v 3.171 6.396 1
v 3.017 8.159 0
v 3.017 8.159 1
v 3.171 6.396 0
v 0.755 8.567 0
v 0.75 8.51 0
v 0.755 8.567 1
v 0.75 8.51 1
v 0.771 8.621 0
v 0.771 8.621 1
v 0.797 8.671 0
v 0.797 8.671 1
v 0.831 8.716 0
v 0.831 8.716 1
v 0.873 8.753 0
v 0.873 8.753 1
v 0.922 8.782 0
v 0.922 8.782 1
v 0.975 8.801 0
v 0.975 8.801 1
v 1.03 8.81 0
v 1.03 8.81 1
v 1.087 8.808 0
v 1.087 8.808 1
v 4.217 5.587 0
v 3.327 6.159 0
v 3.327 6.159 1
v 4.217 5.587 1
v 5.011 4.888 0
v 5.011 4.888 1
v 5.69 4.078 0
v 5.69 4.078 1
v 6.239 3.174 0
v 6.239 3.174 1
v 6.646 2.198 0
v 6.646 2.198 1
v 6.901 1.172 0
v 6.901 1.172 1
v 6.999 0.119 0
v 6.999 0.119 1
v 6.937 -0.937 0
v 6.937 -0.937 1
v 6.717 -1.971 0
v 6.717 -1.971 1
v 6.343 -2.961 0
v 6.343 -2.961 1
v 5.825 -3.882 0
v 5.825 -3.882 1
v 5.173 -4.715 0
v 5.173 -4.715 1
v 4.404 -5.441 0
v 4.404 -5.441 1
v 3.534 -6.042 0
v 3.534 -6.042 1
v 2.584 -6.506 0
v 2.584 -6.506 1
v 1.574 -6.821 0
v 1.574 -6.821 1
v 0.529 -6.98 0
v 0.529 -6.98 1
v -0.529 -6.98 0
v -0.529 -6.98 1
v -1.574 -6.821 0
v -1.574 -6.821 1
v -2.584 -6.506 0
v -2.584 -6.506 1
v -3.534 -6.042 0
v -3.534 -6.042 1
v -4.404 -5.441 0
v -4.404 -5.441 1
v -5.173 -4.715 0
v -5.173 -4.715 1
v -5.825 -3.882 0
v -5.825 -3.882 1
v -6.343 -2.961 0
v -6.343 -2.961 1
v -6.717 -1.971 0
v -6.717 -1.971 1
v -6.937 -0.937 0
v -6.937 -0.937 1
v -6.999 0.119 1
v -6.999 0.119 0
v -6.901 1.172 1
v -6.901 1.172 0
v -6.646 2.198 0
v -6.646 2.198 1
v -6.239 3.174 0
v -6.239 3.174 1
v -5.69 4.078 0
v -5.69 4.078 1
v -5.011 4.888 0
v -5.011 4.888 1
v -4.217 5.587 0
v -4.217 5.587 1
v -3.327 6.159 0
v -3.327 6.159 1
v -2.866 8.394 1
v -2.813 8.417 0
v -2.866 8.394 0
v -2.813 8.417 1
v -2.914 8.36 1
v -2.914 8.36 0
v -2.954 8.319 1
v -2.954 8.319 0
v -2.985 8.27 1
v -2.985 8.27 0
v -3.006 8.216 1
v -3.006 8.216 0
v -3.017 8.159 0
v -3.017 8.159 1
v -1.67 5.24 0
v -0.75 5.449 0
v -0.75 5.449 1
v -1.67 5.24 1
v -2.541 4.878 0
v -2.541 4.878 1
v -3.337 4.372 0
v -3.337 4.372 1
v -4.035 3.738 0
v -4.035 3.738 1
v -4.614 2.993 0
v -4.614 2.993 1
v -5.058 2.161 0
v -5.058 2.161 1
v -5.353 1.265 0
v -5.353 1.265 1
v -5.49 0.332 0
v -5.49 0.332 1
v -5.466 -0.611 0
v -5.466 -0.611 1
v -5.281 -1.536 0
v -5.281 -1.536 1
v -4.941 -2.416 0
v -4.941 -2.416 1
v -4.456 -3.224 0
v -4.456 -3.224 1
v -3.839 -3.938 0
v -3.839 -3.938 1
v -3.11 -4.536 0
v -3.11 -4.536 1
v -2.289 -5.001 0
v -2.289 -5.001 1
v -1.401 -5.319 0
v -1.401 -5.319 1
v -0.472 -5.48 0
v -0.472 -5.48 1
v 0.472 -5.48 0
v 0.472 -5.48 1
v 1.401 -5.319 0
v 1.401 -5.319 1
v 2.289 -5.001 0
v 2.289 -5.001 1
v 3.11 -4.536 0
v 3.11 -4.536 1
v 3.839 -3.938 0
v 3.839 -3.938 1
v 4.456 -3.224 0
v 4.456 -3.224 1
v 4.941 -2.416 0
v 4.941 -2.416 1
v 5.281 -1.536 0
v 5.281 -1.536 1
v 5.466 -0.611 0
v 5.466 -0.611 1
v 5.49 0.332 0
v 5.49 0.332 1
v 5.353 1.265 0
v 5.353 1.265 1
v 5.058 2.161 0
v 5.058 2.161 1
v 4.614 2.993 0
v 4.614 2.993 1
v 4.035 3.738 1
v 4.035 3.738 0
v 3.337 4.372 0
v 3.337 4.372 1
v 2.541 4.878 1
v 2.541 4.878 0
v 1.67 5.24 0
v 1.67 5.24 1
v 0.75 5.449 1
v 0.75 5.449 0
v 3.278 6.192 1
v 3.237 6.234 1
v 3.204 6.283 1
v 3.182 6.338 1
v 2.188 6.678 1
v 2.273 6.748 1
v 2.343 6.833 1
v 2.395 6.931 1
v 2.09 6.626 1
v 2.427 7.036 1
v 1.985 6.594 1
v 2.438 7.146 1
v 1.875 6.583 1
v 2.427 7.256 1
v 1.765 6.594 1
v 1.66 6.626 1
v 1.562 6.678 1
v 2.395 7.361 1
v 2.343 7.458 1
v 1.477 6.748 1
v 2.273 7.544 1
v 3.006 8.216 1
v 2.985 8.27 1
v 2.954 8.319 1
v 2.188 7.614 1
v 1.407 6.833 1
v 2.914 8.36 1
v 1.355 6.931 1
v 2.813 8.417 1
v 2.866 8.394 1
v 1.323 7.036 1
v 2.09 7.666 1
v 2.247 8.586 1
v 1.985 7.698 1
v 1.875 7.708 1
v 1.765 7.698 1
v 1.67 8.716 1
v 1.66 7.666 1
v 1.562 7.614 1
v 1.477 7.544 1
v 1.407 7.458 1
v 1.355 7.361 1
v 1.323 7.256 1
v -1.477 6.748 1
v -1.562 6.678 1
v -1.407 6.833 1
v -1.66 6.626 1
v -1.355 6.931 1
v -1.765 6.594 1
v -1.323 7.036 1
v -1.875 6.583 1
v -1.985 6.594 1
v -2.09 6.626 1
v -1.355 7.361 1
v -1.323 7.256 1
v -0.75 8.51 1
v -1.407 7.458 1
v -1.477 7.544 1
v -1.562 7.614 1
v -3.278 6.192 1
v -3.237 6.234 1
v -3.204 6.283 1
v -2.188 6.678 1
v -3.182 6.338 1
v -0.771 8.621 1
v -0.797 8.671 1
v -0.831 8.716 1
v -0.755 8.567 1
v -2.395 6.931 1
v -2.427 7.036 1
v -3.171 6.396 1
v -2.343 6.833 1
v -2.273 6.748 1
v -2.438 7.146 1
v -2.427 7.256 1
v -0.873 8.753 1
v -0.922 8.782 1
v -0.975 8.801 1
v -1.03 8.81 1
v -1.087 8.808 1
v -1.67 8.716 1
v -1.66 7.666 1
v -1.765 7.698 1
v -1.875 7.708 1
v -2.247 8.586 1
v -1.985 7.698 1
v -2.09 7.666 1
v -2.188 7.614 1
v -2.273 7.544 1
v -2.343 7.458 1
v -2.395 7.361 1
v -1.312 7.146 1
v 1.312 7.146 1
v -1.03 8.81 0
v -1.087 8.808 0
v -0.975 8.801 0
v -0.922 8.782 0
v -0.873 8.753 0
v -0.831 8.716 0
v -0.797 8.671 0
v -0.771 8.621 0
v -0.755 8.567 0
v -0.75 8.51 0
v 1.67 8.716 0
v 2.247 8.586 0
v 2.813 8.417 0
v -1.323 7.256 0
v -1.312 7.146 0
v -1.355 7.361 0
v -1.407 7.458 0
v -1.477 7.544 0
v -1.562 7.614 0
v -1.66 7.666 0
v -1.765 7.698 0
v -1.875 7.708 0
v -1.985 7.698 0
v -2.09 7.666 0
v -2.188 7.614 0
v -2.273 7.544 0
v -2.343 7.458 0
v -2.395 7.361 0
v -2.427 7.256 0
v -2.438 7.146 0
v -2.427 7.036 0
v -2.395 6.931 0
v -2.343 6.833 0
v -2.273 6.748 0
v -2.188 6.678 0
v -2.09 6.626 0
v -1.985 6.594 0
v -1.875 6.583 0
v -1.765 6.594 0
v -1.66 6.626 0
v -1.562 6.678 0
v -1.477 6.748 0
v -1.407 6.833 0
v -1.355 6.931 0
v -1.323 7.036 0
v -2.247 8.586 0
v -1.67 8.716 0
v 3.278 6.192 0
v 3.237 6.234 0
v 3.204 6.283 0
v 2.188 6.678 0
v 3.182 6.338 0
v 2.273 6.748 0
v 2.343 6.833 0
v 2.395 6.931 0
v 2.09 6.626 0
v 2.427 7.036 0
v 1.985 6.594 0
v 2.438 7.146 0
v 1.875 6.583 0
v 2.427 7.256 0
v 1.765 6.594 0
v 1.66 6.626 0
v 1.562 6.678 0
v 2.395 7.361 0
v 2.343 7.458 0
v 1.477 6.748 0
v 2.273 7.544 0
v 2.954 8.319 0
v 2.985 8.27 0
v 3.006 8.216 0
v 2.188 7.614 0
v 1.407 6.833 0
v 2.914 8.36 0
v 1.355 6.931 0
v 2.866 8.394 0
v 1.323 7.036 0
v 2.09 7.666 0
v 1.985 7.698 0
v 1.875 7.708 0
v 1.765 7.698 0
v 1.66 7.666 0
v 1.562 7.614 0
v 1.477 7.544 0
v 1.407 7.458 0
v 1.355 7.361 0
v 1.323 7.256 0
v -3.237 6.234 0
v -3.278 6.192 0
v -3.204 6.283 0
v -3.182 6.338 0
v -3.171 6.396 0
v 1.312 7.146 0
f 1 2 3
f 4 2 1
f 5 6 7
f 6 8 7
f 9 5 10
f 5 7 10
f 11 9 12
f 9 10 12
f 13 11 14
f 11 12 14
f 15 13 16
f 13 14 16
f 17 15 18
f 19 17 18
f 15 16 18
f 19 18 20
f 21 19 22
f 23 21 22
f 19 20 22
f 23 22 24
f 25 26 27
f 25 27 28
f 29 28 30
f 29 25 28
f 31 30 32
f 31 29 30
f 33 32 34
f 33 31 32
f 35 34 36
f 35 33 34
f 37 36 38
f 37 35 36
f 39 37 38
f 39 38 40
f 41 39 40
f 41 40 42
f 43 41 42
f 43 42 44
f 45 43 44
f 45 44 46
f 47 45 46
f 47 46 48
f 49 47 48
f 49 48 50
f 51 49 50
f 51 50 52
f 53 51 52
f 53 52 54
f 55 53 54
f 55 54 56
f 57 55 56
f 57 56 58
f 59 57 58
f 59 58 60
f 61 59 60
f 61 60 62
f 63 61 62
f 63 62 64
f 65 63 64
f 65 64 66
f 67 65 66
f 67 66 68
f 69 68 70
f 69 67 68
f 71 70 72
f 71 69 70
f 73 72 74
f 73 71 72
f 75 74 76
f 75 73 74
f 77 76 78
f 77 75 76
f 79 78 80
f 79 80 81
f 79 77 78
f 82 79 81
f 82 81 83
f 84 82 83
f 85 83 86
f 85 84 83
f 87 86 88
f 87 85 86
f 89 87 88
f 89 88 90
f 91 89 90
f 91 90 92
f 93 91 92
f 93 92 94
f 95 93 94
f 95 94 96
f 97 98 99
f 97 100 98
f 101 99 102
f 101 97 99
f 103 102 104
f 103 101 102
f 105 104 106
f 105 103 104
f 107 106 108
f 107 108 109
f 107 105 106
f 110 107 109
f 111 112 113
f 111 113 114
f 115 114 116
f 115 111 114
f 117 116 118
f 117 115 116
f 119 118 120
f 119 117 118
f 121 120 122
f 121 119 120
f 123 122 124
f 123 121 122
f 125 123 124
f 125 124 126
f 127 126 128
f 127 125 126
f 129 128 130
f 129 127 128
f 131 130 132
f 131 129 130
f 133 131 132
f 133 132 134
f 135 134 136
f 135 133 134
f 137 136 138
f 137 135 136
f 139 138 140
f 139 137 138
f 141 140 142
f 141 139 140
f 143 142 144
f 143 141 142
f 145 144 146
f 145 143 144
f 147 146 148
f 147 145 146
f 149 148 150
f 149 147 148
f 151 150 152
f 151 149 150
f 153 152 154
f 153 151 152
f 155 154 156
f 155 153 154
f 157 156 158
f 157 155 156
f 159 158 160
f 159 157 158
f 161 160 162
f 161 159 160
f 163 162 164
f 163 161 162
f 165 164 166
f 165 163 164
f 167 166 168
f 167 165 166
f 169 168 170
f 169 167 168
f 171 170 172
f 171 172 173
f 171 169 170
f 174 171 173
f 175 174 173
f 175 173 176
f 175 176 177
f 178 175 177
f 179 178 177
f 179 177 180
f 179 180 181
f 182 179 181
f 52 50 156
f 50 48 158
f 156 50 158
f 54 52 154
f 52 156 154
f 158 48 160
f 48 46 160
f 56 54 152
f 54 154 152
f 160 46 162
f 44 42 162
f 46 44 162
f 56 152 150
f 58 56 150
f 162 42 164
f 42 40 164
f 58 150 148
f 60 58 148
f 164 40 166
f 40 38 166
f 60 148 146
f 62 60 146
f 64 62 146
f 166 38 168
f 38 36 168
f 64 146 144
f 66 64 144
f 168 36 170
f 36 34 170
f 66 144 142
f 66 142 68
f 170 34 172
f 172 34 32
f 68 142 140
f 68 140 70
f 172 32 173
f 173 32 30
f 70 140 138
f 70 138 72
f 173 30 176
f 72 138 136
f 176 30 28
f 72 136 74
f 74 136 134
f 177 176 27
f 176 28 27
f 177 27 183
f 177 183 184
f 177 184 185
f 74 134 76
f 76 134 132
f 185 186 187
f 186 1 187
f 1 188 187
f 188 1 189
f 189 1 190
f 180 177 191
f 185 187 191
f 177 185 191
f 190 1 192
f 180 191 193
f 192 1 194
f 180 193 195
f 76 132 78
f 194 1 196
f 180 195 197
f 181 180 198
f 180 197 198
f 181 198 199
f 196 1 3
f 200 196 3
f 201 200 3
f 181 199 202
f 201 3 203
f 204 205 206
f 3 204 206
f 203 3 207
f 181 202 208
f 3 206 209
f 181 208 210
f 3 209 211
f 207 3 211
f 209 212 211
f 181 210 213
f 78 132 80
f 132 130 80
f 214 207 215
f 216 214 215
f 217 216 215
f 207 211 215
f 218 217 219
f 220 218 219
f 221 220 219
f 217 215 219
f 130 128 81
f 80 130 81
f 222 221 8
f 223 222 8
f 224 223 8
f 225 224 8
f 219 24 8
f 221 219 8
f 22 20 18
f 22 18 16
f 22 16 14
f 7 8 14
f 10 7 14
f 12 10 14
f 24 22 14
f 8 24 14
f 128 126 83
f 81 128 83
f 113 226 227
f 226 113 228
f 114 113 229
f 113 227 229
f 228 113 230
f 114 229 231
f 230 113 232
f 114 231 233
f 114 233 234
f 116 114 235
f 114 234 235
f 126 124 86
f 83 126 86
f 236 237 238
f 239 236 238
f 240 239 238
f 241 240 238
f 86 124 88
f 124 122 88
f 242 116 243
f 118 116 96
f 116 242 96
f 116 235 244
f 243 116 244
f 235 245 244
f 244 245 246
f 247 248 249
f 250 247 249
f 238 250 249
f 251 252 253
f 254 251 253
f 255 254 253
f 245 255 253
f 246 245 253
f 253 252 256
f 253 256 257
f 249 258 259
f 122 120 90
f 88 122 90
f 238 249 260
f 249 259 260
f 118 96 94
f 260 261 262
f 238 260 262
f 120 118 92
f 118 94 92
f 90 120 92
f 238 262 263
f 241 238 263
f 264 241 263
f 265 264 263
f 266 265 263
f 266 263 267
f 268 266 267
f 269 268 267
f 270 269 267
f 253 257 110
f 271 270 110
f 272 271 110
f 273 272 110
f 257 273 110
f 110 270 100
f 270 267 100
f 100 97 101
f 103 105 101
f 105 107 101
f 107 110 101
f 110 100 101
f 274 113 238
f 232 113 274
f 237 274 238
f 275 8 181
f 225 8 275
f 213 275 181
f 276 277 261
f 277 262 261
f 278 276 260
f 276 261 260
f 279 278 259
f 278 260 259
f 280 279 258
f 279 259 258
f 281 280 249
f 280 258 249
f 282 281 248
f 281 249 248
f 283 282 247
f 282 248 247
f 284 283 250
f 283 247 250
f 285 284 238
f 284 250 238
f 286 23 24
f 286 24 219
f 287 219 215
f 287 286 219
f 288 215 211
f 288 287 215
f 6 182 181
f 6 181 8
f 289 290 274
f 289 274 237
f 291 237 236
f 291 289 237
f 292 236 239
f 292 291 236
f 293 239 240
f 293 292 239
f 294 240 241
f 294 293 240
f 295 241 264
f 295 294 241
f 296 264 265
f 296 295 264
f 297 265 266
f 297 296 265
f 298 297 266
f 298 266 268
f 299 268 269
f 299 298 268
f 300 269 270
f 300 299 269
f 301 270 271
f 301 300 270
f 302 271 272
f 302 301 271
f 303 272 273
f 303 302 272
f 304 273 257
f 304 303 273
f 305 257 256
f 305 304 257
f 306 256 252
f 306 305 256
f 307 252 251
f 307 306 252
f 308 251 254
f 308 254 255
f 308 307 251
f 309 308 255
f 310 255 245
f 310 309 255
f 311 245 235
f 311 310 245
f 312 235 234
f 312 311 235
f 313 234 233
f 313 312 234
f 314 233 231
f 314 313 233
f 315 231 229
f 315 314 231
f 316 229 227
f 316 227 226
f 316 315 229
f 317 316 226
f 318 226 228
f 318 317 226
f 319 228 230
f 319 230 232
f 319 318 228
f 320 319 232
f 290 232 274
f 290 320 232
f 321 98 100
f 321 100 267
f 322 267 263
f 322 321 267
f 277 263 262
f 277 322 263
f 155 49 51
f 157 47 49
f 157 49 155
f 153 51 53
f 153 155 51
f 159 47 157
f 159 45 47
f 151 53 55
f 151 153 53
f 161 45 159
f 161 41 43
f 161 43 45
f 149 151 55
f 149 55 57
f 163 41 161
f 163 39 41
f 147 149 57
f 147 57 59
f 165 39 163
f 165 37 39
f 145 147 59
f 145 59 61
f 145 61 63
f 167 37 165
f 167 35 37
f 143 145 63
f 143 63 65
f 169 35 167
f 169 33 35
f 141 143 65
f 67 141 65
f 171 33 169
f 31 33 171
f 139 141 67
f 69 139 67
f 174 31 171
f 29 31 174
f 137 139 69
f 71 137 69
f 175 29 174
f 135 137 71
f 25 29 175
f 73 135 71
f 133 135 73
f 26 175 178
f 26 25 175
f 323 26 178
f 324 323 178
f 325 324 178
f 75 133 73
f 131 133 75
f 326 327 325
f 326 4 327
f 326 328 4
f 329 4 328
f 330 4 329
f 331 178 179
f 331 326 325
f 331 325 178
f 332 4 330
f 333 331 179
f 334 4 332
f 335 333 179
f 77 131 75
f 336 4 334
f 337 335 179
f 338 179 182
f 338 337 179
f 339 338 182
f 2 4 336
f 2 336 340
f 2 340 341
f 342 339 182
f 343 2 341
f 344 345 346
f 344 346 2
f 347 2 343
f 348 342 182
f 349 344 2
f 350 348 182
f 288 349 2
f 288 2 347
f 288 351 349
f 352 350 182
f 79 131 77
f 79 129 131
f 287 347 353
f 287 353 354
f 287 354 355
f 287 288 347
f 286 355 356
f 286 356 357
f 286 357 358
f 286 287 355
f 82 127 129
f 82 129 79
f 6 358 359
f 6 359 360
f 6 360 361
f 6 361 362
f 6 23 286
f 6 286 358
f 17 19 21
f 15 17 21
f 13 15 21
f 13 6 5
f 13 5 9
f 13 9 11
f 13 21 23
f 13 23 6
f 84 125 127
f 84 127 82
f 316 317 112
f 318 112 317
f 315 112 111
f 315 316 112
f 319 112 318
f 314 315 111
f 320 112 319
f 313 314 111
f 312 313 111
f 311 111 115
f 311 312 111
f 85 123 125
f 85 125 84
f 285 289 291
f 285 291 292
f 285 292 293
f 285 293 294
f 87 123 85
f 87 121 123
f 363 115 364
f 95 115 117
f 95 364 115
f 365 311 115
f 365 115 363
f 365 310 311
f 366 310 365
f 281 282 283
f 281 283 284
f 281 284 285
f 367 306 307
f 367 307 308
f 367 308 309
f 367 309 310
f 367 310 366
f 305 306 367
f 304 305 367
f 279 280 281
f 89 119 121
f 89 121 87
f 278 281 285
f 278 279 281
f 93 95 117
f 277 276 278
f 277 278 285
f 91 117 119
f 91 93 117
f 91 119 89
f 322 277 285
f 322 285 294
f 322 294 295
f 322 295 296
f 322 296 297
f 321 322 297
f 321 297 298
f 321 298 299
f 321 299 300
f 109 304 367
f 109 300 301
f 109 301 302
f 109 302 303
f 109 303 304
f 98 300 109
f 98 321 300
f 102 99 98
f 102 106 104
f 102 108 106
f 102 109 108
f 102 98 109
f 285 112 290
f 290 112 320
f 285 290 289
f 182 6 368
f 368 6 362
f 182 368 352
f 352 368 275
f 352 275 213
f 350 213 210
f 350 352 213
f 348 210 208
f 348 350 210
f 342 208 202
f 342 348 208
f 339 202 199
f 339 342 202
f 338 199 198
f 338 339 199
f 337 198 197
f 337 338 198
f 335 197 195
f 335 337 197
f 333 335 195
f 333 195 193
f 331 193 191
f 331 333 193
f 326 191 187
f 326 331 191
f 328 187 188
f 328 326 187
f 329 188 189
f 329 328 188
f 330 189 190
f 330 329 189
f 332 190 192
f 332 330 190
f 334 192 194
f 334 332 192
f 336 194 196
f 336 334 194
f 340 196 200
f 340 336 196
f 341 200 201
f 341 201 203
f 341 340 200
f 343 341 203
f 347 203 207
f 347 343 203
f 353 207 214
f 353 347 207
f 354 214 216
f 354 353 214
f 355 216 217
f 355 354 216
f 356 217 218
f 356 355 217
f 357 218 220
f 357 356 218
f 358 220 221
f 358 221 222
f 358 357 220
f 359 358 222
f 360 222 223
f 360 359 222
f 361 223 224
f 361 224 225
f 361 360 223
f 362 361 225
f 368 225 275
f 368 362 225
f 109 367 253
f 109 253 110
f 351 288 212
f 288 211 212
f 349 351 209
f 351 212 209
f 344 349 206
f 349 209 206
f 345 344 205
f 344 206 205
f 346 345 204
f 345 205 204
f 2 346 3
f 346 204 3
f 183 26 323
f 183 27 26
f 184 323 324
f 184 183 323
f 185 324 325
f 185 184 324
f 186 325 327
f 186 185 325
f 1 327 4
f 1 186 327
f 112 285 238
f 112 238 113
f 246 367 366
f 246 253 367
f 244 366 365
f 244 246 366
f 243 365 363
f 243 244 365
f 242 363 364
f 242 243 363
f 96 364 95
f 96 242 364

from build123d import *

# Parameters (mm, degrees)
SKETCH_1_R      = 0.5625
EXTRUDE_1_DEPTH = 1
FILLET_1_R      = 0.3
FILLET_2_R      = 0.3


with BuildPart() as part:
    # 草图1 → 凸台-拉伸1 (new body)
    with BuildSketch(Plane.XY):
        with BuildLine():
            Line((-0.75, 8.843253078), (-0.75, 5.448623679))
            ThreePointArc((-0.75, 5.448623679), (0, -5.5), (0.75, 5.448623679))
            Line((0.75, 5.448623679), (0.75, 8.843253078))
            ThreePointArc((0.75, 8.843253078), (1.890982428, 8.671205825), (3, 8.352581936))
            Line((3, 8.352581936), (3.185419652, 6.233225621))
            ThreePointArc((3.185419652, 6.233225621), (0, -7), (-3.185419652, 6.233225621))
            Line((-3.185419652, 6.233225621), (-3, 8.352581936))
            ThreePointArc((-3, 8.352581936), (-1.890982428, 8.671205825), (-0.75, 8.843253078))
        make_face()
        with Locations((-1.875, 7.145938379)):
            Circle(SKETCH_1_R, mode=Mode.SUBTRACT)
        with Locations(Location((1.875, 7.145938379, 0), (0, 0, 180))):
            Circle(SKETCH_1_R, mode=Mode.SUBTRACT)
    extrude(amount=EXTRUDE_1_DEPTH)

    # 圆角1
    fillet_1_edges = [part.edges().sort_by_distance(p)[0] for p in [
        (3, 8.352581936, 0.5),
        (-3, 8.352581936, 0.5),
    ]]
    fillet(fillet_1_edges, radius=FILLET_1_R)

    # 圆角2
    fillet_2_edges = [part.edges().sort_by_distance(p)[0] for p in [
        (3.185419652, 6.233225621, 0.5),
        (-3.185419652, 6.233225621, 0.5),
        (-0.75, 8.843253078, 0.5),
        (0.75, 8.843253078, 0.5),
    ]]
    fillet(fillet_2_edges, radius=FILLET_2_R)


solid = part.part
